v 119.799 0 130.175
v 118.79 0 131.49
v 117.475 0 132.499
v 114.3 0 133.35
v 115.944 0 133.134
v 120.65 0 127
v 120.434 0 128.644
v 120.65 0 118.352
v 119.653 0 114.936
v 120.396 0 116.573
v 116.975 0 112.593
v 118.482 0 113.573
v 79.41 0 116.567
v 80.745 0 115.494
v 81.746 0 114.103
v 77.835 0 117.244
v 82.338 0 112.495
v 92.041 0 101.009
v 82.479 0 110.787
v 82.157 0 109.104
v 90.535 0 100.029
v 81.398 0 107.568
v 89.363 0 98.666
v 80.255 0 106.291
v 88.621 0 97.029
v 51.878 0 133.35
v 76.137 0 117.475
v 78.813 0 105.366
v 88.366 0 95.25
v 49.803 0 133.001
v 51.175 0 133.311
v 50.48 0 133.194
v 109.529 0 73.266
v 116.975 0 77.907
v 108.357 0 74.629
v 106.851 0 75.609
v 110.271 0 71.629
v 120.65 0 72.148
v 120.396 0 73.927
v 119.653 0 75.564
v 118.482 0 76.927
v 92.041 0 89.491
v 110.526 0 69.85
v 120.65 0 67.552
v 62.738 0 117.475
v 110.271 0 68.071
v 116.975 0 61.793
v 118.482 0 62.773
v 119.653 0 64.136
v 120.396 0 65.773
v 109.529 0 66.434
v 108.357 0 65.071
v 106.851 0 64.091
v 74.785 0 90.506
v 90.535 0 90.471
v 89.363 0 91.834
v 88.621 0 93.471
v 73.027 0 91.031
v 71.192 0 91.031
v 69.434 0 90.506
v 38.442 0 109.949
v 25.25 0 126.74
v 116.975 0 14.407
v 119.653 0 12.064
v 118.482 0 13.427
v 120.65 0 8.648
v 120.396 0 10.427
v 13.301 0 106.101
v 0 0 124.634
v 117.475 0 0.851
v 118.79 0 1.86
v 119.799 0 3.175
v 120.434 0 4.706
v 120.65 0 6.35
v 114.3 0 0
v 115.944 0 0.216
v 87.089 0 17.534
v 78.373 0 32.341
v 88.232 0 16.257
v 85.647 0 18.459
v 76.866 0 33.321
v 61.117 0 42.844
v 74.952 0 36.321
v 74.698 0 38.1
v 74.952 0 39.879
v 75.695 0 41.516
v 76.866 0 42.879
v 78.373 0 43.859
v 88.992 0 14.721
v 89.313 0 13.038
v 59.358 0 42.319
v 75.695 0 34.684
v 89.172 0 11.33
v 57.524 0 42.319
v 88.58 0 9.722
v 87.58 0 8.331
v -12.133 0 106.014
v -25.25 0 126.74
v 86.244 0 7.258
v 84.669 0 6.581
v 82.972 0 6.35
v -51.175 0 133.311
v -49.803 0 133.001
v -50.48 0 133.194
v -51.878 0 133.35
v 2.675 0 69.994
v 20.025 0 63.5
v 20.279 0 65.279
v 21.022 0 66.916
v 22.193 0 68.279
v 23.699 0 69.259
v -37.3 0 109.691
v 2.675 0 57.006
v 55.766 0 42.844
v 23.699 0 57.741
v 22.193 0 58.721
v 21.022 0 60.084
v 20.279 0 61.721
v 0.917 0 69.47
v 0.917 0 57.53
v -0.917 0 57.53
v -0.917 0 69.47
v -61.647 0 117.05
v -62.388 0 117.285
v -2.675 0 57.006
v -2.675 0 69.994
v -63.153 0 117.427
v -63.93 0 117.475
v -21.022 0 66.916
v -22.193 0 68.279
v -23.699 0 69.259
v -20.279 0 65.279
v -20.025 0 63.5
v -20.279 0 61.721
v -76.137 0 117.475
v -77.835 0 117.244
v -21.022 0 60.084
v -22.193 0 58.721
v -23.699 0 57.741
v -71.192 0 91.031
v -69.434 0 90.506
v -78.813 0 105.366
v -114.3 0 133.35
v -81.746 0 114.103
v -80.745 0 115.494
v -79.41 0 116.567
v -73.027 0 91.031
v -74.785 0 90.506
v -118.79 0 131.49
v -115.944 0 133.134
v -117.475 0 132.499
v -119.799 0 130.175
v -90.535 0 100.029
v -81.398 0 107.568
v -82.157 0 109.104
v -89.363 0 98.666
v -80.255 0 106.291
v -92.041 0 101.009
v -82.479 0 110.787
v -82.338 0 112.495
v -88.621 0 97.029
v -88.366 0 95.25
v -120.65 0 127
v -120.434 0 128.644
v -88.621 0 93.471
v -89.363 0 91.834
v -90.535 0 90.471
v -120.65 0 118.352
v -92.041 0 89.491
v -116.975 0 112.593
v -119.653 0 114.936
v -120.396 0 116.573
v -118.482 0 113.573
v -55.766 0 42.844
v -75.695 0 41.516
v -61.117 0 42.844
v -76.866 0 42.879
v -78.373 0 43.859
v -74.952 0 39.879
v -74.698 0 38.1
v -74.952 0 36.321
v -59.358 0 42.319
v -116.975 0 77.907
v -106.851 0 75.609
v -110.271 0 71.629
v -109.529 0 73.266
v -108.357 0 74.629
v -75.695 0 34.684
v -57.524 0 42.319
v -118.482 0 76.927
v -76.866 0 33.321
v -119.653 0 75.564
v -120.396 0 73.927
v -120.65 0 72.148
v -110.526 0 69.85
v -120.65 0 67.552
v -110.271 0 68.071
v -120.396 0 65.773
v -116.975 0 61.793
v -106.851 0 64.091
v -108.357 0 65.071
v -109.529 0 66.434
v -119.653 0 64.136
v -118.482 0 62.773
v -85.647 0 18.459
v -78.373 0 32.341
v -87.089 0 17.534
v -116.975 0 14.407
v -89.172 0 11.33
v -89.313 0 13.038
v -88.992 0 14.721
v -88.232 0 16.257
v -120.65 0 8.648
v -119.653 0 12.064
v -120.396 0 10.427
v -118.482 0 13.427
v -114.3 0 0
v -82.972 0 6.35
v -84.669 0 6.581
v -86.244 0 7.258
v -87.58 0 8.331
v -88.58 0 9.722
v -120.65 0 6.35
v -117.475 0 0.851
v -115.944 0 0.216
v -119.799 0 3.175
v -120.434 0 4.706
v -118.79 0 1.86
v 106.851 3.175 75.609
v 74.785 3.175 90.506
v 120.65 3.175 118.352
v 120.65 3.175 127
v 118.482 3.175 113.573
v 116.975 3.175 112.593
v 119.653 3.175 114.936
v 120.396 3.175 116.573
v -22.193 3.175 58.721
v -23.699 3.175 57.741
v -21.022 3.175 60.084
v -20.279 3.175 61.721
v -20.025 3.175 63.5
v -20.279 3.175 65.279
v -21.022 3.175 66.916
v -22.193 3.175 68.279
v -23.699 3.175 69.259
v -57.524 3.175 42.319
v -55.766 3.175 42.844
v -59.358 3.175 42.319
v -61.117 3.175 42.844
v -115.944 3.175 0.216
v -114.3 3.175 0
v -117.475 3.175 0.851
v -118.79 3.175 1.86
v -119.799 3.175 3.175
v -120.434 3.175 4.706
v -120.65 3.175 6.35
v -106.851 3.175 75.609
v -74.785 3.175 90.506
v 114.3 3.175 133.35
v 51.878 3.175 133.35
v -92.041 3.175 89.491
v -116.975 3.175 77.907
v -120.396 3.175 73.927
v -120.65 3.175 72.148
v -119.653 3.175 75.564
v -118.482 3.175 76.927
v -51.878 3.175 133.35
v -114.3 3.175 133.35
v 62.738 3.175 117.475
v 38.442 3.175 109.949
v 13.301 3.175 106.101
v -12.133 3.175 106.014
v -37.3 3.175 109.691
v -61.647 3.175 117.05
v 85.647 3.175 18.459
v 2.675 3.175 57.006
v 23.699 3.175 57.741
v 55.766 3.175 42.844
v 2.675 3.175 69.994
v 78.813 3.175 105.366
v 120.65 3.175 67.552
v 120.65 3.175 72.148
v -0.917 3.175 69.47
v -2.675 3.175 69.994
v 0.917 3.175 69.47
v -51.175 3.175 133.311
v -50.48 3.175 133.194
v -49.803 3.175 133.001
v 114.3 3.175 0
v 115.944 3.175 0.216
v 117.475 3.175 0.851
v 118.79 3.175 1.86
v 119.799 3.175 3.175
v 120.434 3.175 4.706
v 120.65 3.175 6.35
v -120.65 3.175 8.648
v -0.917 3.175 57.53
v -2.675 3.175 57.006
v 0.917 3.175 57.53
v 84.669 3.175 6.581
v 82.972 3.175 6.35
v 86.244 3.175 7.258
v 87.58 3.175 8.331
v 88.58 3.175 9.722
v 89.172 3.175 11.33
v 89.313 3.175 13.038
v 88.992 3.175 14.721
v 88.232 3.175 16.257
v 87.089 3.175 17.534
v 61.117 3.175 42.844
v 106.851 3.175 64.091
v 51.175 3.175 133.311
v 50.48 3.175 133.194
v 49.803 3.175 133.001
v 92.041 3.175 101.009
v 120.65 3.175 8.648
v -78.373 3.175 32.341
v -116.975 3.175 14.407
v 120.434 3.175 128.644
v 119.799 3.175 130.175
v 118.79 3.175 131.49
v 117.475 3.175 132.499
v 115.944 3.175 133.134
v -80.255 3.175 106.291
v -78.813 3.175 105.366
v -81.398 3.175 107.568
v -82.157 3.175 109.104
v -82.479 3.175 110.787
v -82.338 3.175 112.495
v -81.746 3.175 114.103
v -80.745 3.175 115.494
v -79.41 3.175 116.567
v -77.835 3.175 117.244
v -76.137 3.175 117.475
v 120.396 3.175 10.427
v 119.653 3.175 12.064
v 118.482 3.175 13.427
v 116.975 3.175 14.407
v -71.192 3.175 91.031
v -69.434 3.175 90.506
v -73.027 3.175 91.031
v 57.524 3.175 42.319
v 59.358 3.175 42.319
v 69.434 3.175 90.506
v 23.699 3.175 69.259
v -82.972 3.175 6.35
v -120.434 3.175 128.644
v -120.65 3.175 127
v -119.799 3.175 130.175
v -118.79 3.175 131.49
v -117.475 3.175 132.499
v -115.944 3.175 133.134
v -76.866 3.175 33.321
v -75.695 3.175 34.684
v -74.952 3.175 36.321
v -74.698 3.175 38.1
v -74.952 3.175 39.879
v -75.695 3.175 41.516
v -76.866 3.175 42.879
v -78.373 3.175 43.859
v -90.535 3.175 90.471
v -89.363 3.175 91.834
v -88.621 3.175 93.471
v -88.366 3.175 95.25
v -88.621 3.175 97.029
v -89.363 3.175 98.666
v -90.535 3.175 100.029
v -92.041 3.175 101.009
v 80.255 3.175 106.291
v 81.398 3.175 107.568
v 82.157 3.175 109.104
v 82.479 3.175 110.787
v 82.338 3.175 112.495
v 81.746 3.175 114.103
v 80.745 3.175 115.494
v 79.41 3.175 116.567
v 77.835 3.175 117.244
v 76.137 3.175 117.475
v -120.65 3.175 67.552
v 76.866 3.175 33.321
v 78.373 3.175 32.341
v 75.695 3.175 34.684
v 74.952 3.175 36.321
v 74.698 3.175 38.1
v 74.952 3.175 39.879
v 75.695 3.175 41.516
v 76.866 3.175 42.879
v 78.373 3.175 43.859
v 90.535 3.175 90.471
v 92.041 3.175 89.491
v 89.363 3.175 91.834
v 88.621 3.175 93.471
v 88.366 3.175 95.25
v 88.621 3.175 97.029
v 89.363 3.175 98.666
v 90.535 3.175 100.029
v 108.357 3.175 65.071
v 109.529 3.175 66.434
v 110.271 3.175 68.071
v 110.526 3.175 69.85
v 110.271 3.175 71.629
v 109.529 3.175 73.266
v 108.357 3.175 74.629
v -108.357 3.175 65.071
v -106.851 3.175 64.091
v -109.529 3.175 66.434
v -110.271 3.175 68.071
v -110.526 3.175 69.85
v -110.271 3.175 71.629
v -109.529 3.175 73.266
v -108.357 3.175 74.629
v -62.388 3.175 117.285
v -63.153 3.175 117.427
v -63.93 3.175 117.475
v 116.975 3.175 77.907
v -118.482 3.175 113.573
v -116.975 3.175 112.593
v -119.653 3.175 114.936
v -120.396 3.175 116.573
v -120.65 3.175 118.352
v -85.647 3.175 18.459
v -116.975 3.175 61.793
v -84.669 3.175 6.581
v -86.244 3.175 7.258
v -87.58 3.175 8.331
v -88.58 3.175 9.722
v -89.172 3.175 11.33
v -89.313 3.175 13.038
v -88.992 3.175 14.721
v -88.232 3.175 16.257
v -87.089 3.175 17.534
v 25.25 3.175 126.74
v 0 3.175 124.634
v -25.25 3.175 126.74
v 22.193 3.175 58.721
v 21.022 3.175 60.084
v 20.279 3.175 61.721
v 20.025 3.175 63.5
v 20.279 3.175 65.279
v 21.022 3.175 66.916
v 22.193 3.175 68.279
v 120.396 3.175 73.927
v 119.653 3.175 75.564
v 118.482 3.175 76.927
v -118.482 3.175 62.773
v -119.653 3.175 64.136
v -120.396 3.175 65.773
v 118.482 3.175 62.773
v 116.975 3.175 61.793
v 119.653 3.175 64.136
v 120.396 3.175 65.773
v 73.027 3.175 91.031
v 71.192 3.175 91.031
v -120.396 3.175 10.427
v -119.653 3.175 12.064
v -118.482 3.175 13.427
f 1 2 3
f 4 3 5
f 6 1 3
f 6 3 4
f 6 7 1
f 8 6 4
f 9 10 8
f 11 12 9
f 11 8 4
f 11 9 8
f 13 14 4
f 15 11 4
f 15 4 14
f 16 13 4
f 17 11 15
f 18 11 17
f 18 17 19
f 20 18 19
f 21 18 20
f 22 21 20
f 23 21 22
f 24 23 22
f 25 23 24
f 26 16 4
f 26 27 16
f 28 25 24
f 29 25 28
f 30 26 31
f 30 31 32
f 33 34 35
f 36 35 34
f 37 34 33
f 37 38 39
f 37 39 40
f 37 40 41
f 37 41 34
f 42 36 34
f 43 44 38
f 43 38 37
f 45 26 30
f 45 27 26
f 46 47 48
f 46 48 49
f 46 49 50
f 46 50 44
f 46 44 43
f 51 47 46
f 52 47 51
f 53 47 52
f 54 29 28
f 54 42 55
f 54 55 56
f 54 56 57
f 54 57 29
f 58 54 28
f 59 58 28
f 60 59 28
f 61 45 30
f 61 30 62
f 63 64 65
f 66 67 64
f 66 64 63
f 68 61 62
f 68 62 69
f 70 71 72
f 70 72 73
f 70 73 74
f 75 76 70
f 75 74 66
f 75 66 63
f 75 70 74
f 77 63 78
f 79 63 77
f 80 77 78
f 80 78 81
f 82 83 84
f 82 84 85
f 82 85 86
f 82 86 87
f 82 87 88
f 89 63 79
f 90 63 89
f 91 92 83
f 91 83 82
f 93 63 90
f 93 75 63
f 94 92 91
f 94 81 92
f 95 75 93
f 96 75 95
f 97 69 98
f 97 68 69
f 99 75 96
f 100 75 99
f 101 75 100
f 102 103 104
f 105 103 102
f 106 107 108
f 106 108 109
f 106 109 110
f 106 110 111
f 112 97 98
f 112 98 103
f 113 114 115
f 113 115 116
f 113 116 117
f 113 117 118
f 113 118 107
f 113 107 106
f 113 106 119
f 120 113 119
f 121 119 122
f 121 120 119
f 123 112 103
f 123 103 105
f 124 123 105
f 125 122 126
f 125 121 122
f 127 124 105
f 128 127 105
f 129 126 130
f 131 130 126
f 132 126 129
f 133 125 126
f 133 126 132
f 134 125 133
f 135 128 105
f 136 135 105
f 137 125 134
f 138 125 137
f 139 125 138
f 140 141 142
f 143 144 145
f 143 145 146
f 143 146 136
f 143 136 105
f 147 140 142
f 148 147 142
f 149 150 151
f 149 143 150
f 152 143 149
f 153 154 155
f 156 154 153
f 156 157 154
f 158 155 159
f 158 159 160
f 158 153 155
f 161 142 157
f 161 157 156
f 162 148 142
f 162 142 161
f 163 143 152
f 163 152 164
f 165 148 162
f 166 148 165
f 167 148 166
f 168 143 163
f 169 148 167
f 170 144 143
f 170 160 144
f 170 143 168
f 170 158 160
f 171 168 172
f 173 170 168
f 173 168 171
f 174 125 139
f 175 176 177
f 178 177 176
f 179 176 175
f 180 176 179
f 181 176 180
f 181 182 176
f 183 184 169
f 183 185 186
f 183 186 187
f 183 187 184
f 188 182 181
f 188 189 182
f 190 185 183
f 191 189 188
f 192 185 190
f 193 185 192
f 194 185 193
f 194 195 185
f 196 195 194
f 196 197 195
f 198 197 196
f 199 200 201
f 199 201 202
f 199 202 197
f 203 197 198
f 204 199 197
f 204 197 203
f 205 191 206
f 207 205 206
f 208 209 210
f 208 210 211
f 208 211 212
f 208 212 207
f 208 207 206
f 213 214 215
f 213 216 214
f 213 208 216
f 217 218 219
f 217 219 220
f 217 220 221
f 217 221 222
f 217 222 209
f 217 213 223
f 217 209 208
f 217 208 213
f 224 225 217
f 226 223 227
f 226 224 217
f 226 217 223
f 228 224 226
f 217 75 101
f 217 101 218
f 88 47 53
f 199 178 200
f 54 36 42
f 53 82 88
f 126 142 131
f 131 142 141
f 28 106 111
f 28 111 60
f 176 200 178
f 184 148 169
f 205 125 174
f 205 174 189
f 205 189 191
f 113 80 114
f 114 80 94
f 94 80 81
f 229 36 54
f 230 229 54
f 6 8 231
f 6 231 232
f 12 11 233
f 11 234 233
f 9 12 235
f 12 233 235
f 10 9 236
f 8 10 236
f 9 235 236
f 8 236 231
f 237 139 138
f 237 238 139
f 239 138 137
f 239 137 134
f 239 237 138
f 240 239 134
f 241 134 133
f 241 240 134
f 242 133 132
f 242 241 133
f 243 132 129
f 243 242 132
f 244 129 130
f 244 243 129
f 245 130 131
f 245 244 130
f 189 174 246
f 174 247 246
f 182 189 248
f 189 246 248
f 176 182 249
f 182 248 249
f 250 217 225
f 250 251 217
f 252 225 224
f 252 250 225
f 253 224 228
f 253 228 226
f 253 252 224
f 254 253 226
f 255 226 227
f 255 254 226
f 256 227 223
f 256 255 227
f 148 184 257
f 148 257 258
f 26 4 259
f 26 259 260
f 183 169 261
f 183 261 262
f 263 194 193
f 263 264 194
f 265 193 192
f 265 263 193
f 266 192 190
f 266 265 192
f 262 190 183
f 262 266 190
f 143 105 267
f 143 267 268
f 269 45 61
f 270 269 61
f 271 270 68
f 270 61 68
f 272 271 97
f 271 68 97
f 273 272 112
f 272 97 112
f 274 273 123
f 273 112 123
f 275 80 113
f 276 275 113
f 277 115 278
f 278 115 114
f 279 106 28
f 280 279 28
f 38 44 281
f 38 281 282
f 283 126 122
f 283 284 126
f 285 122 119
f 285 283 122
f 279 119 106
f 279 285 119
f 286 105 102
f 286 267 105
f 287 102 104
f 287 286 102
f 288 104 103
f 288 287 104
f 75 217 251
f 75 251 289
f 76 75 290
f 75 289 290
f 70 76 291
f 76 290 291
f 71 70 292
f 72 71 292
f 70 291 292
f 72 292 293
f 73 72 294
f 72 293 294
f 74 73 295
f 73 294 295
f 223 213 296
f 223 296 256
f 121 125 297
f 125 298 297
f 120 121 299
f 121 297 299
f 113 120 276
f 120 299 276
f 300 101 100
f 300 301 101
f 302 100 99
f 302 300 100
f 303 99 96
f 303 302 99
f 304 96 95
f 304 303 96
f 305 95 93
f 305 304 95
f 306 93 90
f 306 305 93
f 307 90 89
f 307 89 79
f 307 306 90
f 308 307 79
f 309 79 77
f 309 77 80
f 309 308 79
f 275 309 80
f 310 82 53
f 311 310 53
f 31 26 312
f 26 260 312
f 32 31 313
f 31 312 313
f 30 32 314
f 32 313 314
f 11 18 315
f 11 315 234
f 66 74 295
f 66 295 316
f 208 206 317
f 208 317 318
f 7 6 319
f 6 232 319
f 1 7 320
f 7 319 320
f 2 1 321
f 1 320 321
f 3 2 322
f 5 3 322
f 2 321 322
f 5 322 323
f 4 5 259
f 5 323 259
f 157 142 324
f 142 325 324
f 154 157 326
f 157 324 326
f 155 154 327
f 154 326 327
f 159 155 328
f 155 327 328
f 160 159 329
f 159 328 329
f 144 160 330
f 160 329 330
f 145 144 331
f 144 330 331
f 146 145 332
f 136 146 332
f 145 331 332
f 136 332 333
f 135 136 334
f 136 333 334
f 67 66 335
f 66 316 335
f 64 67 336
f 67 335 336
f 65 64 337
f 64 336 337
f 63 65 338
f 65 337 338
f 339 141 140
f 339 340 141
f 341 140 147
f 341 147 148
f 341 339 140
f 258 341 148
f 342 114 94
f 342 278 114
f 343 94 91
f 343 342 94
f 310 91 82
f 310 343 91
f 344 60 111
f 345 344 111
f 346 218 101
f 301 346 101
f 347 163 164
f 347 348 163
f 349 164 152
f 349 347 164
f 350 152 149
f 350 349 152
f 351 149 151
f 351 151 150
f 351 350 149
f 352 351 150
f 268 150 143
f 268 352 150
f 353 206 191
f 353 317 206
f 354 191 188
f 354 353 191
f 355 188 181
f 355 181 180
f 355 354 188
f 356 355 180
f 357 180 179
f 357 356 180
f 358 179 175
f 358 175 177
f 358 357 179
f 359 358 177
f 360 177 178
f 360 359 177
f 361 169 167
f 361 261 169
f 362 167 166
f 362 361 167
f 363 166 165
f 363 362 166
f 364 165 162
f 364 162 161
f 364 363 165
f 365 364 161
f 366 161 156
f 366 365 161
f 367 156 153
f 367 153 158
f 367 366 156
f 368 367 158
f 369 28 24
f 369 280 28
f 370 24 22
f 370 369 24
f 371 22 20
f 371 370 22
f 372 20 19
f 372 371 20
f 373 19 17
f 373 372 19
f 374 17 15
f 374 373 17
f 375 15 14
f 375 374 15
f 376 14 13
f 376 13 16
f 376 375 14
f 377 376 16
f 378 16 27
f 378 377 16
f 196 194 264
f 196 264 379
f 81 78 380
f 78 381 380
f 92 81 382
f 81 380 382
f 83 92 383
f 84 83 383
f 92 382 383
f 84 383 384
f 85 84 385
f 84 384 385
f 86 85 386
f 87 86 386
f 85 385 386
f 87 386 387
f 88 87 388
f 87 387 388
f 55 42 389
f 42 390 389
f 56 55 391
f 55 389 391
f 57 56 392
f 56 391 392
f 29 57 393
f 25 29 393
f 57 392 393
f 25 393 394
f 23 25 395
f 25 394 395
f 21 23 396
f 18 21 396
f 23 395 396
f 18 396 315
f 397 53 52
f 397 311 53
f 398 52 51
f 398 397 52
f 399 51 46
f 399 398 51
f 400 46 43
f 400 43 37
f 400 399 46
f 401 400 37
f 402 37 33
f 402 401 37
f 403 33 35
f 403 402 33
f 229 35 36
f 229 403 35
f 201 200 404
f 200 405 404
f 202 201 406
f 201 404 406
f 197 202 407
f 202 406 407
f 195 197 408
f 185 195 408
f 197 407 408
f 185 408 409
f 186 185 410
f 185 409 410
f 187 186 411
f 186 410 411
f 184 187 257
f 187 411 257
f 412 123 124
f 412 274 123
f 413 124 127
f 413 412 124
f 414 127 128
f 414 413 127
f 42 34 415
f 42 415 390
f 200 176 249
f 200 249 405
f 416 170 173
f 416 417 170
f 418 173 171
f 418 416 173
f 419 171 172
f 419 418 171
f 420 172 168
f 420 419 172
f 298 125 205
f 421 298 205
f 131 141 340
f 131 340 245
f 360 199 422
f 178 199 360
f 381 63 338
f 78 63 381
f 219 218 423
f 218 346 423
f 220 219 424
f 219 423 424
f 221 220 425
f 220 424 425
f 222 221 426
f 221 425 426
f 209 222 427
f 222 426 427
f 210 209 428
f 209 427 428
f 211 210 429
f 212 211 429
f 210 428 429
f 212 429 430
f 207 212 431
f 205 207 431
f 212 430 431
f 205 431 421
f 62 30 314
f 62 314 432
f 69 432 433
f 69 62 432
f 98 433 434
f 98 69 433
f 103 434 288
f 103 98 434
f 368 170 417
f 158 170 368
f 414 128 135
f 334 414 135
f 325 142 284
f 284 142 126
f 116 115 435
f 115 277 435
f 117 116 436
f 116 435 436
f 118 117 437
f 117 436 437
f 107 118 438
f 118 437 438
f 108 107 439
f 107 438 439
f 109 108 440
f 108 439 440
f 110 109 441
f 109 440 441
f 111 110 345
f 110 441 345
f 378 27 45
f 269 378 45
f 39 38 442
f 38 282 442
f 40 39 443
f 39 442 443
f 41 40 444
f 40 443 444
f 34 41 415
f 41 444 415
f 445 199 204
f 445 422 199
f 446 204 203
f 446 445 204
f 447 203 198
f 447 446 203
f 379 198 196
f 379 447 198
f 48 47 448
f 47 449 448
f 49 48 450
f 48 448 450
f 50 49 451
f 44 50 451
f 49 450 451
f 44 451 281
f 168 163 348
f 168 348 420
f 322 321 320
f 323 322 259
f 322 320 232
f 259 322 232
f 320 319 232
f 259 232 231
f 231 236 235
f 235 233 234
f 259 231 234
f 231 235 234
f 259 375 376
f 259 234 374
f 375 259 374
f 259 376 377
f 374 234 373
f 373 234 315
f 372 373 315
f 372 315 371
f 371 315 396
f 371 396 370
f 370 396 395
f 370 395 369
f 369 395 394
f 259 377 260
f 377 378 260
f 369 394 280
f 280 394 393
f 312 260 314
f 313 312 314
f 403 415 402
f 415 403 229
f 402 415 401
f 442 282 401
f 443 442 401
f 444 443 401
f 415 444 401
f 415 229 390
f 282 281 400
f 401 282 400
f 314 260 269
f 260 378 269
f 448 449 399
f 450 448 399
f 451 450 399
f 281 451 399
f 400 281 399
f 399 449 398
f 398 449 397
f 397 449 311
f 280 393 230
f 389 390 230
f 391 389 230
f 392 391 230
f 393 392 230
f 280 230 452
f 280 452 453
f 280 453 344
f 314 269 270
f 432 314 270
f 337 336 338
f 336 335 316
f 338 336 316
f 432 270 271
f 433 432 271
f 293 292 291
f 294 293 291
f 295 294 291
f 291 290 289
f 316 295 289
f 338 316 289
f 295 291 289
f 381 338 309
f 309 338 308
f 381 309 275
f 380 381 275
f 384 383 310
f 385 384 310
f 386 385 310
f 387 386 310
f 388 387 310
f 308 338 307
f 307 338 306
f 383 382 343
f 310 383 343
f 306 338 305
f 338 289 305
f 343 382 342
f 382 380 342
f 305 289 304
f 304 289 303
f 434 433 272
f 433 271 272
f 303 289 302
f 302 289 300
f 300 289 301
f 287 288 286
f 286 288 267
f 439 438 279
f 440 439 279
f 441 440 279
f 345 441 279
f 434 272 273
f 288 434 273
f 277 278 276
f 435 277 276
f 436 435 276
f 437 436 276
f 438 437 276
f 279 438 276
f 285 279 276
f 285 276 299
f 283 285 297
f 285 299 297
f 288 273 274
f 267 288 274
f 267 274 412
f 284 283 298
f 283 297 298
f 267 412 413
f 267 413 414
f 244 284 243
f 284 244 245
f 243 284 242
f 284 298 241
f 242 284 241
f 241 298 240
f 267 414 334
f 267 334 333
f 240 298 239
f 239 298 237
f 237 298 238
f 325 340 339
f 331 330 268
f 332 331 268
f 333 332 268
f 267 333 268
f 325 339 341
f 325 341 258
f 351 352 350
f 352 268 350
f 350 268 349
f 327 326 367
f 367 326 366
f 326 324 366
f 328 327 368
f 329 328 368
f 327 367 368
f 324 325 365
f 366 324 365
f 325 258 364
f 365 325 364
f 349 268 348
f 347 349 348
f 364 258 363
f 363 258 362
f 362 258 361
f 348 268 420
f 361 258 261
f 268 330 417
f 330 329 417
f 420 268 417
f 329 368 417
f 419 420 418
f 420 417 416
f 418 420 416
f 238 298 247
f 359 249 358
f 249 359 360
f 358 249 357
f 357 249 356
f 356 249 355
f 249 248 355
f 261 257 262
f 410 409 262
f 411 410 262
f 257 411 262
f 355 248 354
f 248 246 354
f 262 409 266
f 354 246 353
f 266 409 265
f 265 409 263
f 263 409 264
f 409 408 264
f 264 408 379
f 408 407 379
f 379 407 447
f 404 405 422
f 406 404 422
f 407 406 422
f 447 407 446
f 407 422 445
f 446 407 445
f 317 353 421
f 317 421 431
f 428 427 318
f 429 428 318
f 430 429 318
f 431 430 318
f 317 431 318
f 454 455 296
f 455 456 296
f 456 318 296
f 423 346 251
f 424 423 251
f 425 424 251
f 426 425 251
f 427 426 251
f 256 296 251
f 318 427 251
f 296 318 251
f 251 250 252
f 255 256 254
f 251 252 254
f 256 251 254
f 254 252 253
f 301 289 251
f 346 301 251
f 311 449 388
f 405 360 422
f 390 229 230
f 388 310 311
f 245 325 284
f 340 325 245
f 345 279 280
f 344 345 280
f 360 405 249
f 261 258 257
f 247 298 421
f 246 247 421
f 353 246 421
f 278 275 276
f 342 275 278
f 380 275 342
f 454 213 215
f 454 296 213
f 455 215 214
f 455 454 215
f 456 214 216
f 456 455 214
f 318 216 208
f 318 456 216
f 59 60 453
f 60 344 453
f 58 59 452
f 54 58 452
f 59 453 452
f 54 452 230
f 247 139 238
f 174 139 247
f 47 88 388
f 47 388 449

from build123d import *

# Parameters (mm, degrees)
BOSS_EXTRUDE1_DEPTH = 3.175
FILLET1_R           = 6.35
FILLET2_R           = 6.35


with BuildPart() as part:
    # Sketch1 → Boss-Extrude1 (new body)
    with BuildSketch(Plane(origin=(0, 0, 0), x_dir=(1, 0, 0), z_dir=(0, 1, 0))):
        with BuildLine():
            Line((-120.65, 0), (120.65, 0))
            Line((120.65, 0), (120.65, -12.7))
            Line((120.65, -12.7), (65.976752043, -38.1))
            Line((65.976752043, -38.1), (120.65, -63.5))
            Line((120.65, -63.5), (120.65, -76.2))
            Line((120.65, -76.2), (79.645064032, -95.25))
            Line((79.645064032, -95.25), (120.65, -114.3))
            Line((120.65, -114.3), (120.65, -133.35))
            Line((120.65, -133.35), (50.8, -133.35))
            ThreePointArc((50.8, -133.35), (0, -124.634097937), (-50.8, -133.35))
            Line((-50.8, -133.35), (-120.65, -133.35))
            Line((-120.65, -133.35), (-120.65, -114.3))
            Line((-120.65, -114.3), (-79.645064032, -95.25))
            Line((-79.645064032, -95.25), (-120.65, -76.2))
            Line((-120.65, -76.2), (-120.65, -63.5))
            Line((-120.65, -63.5), (-65.976752043, -38.1))
            Line((-65.976752043, -38.1), (-120.65, -12.7))
            Line((-120.65, -12.7), (-120.65, 0))
        make_face()
        Polygon((-111.711303819, -6.35), (111.711303819, -6.35), (0, -58.248638237), align=None, mode=Mode.SUBTRACT)
        Polygon((-58.441082652, -41.600907842), (-119.246973209, -69.85), (-72.109394642, -91.749092158), (-11.303504085, -63.5), align=None, mode=Mode.SUBTRACT)
        Polygon((11.303504085, -63.5), (58.441082652, -41.600907842), (119.246973209, -69.85), (72.109394642, -91.749092158), align=None, mode=Mode.SUBTRACT)
        with BuildLine():
            Line((-104.877147824, -117.475), (0, -68.751361763))
            Line((0, -68.751361763), (104.877147824, -117.475))
            Line((104.877147824, -117.475), (62.737522787, -117.475))
            ThreePointArc((62.737522787, -117.475), (0, -105.584097937), (-62.737522787, -117.475))
            Line((-62.737522787, -117.475), (-104.877147824, -117.475))
        make_face(mode=Mode.SUBTRACT)
    extrude(amount=BOSS_EXTRUDE1_DEPTH)

    # Fillet1
    fillet1_edges = [part.edges().sort_by_distance(p)[0] for p in [
        (104.877147824, 1.5875, 117.475),
        (0, 1.5875, 68.751361763),
        (-104.877147824, 1.5875, 117.475),
        (-62.737522787, 1.5875, 117.475),
        (-111.711303819, 1.5875, 6.35),
        (0, 1.5875, 58.248638237),
        (111.711303819, 1.5875, 6.35),
        (-11.303504085, 1.5875, 63.5),
        (-58.441082652, 1.5875, 41.600907842),
        (-119.246973209, 1.5875, 69.85),
        (-72.109394642, 1.5875, 91.749092158),
        (11.303504085, 1.5875, 63.5),
        (72.109394642, 1.5875, 91.749092158),
        (119.246973209, 1.5875, 69.85),
        (58.441082652, 1.5875, 41.600907842),
    ]]
    fillet(fillet1_edges, radius=FILLET1_R)

    # Fillet2
    fillet2_edges = [part.edges().sort_by_distance(p)[0] for p in [
        (120.65, 1.5875, 12.7),
        (65.976752043, 1.5875, 38.1),
        (120.65, 1.5875, 63.5),
        (120.65, 1.5875, 76.2),
        (79.645064032, 1.5875, 95.25),
        (120.65, 1.5875, 114.3),
        (120.65, 1.5875, 133.35),
        (50.8, 1.5875, 133.35),
        (-50.8, 1.5875, 133.35),
        (-120.65, 1.5875, 133.35),
        (-120.65, 1.5875, 114.3),
        (-79.645064032, 1.5875, 95.25),
        (-120.65, 1.5875, 76.2),
        (-120.65, 1.5875, 63.5),
        (-65.976752043, 1.5875, 38.1),
        (-120.65, 1.5875, 12.7),
        (-120.65, 1.5875, 0),
        (120.65, 1.5875, 0),
    ]]
    fillet(fillet2_edges, radius=FILLET2_R)


solid = part.part
